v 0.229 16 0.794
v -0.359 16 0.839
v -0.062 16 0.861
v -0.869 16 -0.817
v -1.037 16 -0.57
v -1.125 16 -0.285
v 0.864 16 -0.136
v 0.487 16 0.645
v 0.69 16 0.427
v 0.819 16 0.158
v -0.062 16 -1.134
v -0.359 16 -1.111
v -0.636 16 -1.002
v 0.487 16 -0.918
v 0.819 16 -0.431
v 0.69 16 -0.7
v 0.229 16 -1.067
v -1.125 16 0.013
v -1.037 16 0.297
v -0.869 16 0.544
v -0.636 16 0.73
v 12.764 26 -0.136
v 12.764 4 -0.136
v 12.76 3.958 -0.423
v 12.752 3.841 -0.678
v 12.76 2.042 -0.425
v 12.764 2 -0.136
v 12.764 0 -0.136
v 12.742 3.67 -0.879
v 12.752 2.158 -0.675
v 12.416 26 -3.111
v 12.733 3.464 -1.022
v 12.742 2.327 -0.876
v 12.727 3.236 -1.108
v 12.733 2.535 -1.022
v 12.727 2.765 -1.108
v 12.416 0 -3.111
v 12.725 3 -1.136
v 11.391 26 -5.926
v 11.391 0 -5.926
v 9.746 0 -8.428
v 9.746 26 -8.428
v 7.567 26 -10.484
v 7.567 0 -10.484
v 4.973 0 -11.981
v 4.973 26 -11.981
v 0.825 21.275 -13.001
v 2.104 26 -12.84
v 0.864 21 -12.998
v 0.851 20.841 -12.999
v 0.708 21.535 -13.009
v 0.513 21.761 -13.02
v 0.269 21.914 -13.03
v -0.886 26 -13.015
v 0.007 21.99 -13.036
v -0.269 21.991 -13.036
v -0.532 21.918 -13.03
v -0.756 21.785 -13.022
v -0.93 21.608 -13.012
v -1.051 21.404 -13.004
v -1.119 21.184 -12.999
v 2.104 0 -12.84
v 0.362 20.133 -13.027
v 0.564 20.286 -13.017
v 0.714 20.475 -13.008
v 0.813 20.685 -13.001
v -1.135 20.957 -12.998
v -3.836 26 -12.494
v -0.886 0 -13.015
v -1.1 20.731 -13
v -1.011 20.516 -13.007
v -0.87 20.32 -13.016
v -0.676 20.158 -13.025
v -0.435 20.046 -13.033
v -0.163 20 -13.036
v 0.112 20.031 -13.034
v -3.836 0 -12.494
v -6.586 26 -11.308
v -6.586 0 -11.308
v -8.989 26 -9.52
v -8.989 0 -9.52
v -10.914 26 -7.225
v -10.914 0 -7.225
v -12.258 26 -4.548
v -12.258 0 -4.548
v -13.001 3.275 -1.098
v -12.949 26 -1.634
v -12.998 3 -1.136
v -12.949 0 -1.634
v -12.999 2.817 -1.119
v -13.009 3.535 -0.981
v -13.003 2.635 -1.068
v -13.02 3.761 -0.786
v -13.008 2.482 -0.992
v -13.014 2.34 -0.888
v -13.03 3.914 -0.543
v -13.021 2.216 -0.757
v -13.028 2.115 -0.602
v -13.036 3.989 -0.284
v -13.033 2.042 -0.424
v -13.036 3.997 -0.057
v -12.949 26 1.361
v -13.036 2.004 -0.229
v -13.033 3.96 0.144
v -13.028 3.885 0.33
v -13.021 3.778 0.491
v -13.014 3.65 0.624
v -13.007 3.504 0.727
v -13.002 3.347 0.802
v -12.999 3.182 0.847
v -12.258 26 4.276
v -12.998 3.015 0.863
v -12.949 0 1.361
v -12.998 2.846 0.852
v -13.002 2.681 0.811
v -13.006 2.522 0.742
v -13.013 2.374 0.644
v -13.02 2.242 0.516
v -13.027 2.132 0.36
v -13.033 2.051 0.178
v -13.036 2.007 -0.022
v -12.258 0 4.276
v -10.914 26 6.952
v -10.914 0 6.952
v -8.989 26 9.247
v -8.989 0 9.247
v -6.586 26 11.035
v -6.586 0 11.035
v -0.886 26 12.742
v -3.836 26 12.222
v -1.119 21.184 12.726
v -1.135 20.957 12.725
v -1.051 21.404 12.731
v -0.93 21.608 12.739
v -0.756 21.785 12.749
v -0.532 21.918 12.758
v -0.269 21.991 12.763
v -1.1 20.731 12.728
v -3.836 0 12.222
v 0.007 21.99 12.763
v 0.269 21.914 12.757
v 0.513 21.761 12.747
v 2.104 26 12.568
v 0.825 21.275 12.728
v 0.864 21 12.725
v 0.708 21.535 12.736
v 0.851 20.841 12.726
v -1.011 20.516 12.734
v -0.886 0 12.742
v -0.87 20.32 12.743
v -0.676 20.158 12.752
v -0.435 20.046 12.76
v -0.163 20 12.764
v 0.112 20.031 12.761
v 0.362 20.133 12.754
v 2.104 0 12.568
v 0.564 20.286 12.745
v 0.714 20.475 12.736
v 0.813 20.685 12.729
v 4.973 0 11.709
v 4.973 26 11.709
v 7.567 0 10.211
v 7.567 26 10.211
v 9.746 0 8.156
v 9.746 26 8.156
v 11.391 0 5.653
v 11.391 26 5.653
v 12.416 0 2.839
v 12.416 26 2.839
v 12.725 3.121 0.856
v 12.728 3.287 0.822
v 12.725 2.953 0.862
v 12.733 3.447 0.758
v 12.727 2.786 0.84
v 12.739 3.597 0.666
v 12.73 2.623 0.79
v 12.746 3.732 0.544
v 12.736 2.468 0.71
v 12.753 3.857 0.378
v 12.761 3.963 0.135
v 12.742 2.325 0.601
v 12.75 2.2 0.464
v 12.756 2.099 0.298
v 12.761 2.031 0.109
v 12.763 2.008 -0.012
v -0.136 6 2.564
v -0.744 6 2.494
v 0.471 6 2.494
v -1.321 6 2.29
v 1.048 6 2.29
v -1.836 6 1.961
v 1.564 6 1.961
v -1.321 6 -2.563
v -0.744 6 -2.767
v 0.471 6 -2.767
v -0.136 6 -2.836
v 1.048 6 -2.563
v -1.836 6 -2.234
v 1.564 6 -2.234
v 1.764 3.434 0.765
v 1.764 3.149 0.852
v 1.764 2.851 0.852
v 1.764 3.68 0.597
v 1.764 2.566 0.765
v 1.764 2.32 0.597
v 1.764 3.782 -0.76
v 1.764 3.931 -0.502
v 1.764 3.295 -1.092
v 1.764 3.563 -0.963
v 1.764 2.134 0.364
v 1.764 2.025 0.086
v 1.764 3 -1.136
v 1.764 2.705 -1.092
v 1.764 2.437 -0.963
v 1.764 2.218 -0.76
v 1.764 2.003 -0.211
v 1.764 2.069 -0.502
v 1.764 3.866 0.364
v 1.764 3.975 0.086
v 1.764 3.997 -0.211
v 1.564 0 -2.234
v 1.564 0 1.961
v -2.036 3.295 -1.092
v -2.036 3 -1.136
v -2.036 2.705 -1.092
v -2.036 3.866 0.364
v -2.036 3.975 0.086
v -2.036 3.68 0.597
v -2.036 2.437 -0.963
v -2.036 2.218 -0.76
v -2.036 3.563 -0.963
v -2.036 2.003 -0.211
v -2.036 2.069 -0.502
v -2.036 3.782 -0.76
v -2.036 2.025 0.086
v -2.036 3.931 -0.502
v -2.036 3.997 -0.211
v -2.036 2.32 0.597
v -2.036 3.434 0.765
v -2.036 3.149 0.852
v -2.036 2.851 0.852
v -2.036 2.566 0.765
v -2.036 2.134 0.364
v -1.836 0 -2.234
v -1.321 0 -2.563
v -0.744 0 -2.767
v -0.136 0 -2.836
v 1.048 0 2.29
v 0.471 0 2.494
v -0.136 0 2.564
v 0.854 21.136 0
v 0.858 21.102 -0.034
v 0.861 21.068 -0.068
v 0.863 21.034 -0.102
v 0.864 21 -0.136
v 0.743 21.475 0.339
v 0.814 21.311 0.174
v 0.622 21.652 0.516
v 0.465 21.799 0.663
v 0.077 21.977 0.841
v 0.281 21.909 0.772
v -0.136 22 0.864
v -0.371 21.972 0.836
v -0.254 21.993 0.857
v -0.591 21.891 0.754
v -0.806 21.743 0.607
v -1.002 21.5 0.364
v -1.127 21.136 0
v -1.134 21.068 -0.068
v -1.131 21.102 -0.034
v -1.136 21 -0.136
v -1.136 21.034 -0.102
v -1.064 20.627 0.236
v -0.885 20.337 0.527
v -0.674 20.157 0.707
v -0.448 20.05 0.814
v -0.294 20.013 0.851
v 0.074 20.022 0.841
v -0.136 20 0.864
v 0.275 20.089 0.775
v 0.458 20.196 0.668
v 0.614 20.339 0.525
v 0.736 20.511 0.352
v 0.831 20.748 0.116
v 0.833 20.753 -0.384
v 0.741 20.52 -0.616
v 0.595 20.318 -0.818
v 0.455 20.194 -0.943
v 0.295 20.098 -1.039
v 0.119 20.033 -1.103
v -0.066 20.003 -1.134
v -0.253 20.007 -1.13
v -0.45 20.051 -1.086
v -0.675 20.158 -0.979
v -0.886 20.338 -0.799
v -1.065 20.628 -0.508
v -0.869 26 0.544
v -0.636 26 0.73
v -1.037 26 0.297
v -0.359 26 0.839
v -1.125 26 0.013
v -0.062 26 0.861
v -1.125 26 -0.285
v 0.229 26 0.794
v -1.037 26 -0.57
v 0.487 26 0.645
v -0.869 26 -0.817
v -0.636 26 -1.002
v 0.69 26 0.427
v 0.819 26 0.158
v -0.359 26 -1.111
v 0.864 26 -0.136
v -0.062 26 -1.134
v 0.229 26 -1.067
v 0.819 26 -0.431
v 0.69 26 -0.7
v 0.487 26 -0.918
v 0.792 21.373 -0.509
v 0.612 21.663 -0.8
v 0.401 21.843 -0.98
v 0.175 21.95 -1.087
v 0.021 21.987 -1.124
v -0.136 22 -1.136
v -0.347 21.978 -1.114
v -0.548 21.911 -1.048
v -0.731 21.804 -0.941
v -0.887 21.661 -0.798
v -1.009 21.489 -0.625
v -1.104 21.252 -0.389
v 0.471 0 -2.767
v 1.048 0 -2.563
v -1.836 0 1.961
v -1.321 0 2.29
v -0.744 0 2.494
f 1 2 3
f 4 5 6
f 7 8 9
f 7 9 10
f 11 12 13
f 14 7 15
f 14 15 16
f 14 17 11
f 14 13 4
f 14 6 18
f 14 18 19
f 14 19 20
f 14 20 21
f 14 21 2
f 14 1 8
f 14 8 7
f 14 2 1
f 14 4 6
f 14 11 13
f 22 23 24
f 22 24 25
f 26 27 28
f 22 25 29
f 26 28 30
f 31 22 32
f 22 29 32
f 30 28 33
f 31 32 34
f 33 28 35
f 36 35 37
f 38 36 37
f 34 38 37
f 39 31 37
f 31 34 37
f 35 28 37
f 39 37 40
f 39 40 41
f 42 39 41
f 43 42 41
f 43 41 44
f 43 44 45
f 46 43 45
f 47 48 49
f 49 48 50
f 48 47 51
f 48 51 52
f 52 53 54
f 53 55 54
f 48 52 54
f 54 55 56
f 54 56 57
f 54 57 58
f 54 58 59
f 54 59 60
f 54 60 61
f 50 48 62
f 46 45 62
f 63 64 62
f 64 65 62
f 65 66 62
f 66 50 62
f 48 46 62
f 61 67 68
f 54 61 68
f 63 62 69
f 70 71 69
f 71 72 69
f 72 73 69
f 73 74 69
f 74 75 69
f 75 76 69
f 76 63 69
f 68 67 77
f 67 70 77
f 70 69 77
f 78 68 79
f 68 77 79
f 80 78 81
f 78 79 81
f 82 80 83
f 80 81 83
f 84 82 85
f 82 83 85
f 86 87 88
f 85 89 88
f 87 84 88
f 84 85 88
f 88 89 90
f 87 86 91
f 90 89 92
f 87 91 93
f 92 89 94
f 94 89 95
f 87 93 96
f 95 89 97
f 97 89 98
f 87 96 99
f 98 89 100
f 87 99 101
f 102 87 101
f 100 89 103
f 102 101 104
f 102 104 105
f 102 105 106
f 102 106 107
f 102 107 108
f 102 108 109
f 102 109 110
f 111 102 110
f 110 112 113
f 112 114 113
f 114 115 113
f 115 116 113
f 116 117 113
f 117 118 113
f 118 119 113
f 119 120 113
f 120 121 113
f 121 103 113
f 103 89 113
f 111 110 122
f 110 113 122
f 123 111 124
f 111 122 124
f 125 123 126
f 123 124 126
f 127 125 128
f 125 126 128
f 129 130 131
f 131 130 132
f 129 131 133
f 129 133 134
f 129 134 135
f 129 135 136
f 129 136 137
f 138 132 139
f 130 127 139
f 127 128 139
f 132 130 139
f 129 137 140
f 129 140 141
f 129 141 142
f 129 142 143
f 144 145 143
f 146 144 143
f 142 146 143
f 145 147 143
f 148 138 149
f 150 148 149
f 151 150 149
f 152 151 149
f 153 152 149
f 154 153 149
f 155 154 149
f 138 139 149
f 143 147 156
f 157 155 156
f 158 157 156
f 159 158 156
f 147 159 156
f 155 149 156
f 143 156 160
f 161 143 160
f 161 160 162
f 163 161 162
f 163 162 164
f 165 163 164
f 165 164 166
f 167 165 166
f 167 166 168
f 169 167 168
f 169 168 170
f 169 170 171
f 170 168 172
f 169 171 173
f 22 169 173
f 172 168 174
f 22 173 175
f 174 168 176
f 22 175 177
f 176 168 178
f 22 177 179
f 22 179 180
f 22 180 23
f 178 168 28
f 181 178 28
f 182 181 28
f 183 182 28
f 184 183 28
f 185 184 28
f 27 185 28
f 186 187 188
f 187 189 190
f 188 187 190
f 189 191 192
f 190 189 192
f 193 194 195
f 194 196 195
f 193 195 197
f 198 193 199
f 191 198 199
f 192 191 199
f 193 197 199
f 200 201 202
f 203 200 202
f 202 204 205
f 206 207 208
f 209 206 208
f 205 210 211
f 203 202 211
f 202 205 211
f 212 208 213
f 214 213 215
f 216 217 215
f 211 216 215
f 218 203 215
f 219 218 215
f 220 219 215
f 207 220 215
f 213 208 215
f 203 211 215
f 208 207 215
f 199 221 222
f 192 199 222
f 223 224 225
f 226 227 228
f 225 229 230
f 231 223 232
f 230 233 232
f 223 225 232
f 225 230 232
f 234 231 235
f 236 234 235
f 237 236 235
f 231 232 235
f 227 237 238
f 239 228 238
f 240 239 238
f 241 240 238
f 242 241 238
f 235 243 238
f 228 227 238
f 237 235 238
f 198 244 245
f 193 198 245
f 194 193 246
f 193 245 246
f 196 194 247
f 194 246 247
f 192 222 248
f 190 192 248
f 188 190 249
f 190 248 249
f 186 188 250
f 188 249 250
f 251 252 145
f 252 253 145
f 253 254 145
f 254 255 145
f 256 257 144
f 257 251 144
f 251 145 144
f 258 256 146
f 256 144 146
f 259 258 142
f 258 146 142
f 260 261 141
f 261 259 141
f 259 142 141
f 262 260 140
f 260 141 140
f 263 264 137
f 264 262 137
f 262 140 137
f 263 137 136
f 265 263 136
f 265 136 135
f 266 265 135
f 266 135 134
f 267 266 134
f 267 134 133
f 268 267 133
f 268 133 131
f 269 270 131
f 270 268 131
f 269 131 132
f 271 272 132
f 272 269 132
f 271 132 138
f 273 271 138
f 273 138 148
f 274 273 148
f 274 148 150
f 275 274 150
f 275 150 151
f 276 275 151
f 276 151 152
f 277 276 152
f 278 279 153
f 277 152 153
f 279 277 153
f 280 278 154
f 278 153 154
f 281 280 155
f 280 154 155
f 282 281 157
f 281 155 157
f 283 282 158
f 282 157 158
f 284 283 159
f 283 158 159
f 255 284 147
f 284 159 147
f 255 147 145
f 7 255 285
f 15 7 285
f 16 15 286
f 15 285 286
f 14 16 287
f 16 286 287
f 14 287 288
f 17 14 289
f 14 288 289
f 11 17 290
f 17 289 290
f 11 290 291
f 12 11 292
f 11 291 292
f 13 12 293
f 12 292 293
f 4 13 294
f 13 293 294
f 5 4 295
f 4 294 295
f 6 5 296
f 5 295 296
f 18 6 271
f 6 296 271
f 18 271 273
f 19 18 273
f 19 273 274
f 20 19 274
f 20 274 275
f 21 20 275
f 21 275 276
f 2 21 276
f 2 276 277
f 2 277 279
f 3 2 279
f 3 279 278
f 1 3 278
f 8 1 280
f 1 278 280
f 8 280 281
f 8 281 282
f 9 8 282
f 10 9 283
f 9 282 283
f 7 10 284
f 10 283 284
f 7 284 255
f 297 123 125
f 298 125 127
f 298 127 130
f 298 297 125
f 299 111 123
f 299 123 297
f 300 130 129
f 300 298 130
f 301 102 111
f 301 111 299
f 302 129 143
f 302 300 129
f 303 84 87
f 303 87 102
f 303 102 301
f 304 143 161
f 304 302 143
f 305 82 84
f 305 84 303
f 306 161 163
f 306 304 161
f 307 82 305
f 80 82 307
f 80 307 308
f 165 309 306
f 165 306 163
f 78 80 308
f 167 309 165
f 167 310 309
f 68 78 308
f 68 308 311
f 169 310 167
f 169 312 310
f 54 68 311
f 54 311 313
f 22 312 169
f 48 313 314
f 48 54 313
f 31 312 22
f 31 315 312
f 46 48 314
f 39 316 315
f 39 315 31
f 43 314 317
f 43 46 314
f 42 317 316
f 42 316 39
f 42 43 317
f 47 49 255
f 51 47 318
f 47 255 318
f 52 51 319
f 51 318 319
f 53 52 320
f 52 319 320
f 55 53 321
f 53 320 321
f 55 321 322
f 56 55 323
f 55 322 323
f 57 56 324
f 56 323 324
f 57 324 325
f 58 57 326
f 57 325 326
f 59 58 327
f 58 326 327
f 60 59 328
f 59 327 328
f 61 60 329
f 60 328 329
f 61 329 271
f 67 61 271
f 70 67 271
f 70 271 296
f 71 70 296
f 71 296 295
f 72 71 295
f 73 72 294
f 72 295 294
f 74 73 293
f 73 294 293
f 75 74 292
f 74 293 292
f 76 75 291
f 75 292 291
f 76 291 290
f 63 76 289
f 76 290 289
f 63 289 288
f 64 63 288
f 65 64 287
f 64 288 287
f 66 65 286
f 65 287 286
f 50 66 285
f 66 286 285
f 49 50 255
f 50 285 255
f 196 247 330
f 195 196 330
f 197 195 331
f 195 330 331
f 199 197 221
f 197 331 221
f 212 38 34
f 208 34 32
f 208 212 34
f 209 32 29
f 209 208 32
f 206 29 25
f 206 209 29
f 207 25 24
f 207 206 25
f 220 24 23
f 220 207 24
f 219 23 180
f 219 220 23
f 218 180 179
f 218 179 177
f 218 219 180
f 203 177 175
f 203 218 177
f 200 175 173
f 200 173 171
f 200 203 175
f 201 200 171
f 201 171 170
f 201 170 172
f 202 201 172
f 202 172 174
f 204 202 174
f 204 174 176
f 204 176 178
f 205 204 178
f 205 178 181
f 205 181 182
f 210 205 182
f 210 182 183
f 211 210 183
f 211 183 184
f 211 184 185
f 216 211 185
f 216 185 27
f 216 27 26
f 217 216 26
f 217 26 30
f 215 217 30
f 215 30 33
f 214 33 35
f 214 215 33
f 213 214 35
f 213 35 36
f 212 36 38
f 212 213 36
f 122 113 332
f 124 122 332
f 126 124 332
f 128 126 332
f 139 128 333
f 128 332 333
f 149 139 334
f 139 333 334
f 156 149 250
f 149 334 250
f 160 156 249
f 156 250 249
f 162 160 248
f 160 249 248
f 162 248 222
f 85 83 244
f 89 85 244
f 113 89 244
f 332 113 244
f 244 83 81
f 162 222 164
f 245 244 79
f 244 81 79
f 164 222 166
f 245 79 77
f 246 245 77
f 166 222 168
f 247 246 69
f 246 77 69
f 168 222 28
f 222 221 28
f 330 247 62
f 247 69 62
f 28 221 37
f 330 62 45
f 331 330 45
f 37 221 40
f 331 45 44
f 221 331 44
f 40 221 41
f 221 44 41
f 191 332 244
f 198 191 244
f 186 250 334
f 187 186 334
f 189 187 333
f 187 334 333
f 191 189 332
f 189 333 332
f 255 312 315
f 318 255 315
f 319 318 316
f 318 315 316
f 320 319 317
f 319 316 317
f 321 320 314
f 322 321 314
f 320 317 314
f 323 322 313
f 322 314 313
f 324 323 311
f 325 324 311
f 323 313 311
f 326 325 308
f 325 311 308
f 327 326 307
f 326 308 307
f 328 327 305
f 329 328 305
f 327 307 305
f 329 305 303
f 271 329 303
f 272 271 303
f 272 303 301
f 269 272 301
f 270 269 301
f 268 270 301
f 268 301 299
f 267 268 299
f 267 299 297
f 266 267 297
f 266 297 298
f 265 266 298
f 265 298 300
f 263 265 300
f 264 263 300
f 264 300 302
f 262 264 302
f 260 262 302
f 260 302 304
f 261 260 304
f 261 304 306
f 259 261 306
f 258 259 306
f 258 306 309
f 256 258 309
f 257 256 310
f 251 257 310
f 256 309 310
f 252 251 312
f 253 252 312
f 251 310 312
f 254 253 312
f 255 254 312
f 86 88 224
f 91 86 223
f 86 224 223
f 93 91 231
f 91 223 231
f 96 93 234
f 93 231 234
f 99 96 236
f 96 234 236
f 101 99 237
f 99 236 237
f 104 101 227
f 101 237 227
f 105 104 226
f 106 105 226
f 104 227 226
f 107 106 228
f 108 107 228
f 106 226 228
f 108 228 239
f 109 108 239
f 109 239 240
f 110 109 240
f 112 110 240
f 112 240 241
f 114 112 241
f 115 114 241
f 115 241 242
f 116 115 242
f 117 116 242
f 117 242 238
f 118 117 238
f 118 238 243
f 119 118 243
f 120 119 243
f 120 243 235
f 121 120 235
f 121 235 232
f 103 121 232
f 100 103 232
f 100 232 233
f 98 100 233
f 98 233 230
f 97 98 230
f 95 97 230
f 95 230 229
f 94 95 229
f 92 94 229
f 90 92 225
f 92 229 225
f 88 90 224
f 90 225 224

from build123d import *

# Parameters (mm, degrees)
SKETCH1_R               = 12.9
BOSS_EXTRUDE1_DEPTH     = 6
SKETCH2_R               = 12.9
BOSS_EXTRUDE2_DEPTH     = 20
SKETCH3_R               = 1
CUT_EXTRUDE2_DEPTH      = 5
SKETCH4_R               = 1
CUT_EXTRUDE3_DEPTH      = 18
CUT_EXTRUDE3_DEPTH_BACK = 19
CUT_EXTRUDE4_DEPTH      = 19
CUT_EXTRUDE4_DEPTH_BACK = 19
BOSS_EXTRUDE3_DEPTH     = 6
SKETCH7_R               = 1
CUT_EXTRUDE5_DEPTH      = 10


with BuildPart() as part:
    # Sketch1 → Boss-Extrude1 (new body)
    with BuildSketch(Plane(origin=(0, 0, 0), x_dir=(1, 0, 0), z_dir=(0, 1, 0))):
        with Locations((-0.136395343, 0.136395343)):
            Circle(SKETCH1_R)
        with BuildLine():
            Line((-2.036395343, -1.607164235), (-2.036395343, -2.054494887))
            ThreePointArc((-2.036395343, -2.054494887), (-1.150401835, -2.580549786), (-0.136395343, -2.763604657))
            ThreePointArc((-0.136395343, -2.763604657), (0.877611149, -2.580549786), (1.763604657, -2.054494887))
            Line((1.763604657, -2.054494887), (1.763604657, -1.607164235))
            Line((1.763604657, -1.607164235), (1.763604657, 1.87995492))
            Line((1.763604657, 1.87995492), (1.763604657, 2.327285573))
            ThreePointArc((1.763604657, 2.327285573), (0.877611149, 2.853340472), (-0.136395343, 3.036395343))
            ThreePointArc((-0.136395343, 3.036395343), (-1.150401835, 2.853340472), (-2.036395343, 2.327285573))
            Line((-2.036395343, 2.327285573), (-2.036395343, 1.87995492))
            Line((-2.036395343, 1.87995492), (-2.036395343, -1.607164235))
        make_face(mode=Mode.SUBTRACT)
    extrude(amount=BOSS_EXTRUDE1_DEPTH)

    # Sketch2 → Boss-Extrude2 (add)
    with BuildSketch(Plane(origin=(0, 6, 0), x_dir=(1, 0, 0), z_dir=(0, 1, 0))):
        with Locations((-0.136395343, 0.136395343)):
            Circle(SKETCH2_R)
    extrude(amount=BOSS_EXTRUDE2_DEPTH)

    # Sketch3 → Cut-Extrude2 (cut)
    with BuildSketch(Plane(origin=(0, 26, 0), x_dir=(1, 0, 0), z_dir=(0, 1, 0))):
        with Locations((-0.136395343, 0.136395343)):
            Circle(SKETCH3_R)
    extrude(amount=-CUT_EXTRUDE2_DEPTH, mode=Mode.SUBTRACT)

    # Sketch4 → Cut-Extrude3 (cut, two sides)
    with BuildSketch(Plane(origin=(0, 0, 0), x_dir=(0, 0, -1), z_dir=(1, 0, 0))) as cut_extrude3_sk:
        with Locations((0.136395343, 3)):
            Circle(SKETCH4_R)
    extrude(amount=CUT_EXTRUDE3_DEPTH, mode=Mode.SUBTRACT)
    extrude(cut_extrude3_sk.sketch, amount=-CUT_EXTRUDE3_DEPTH_BACK, mode=Mode.SUBTRACT)

    # Sketch5 → Cut-Extrude4 (cut, two sides)
    with BuildSketch(Plane.XY) as cut_extrude4_sk:
        with BuildLine():
            ThreePointArc((-1.136395343, 21), (-0.136395343, 20), (0.863604657, 21))
            Line((0.863604657, 21), (-1.136395343, 21))
        make_face()
        with BuildLine():
            Line((-1.136395343, 21), (0.863604657, 21))
            ThreePointArc((0.863604657, 21), (-0.136395343, 22), (-1.136395343, 21))
        make_face()
        with BuildLine():
            ThreePointArc((-1.136395343, 21), (-0.136395343, 20), (0.863604657, 21))
            Line((0.863604657, 21), (-1.136395343, 21))
        make_face()
        with BuildLine():
            Line((-1.136395343, 21), (0.863604657, 21))
            ThreePointArc((0.863604657, 21), (-0.136395343, 22), (-1.136395343, 21))
        make_face()
    extrude(amount=CUT_EXTRUDE4_DEPTH, mode=Mode.SUBTRACT)
    extrude(cut_extrude4_sk.sketch, amount=-CUT_EXTRUDE4_DEPTH_BACK, mode=Mode.SUBTRACT)

    # Sketch6 → Boss-Extrude3 (add)
    with BuildSketch(Plane.XZ):
        with BuildLine():
            ThreePointArc((-2.036395343, 2.054494887), (-0.136395343, 2.763604657), (1.763604657, 2.054494887))
            Line((1.763604657, 2.054494887), (1.763604657, -2.327285573))
            ThreePointArc((1.763604657, -2.327285573), (-0.136395343, -3.036395343), (-2.036395343, -2.327285573))
            Line((-2.036395343, -2.327285573), (-2.036395343, 2.054494887))
        make_face()
        with BuildLine():
            ThreePointArc((-0.136395343, 2.563604657), (-1.038180301, 2.408557287), (-1.836395343, 1.961222353))
            Line((-1.836395343, 1.961222353), (-1.836395343, 1.607164235))
            Line((-1.836395343, 1.607164235), (-1.836395343, -1.87995492))
            Line((-1.836395343, -1.87995492), (-1.836395343, -2.234013039))
            ThreePointArc((-1.836395343, -2.234013039), (-1.038180301, -2.681347973), (-0.136395343, -2.836395343))
            ThreePointArc((-0.136395343, -2.836395343), (0.765389615, -2.681347973), (1.563604657, -2.234013039))
            Line((1.563604657, -2.234013039), (1.563604657, -1.87995492))
            Line((1.563604657, -1.87995492), (1.563604657, 1.607164235))
            Line((1.563604657, 1.607164235), (1.563604657, 1.961222353))
            ThreePointArc((1.563604657, 1.961222353), (0.765389615, 2.408557287), (-0.136395343, 2.563604657))
        make_face(mode=Mode.SUBTRACT)
    extrude(amount=-BOSS_EXTRUDE3_DEPTH)

    # Sketch7 → Cut-Extrude5 (cut)
    with BuildSketch(Plane(origin=(0, 26, 0), x_dir=(1, 0, 0), z_dir=(0, 1, 0))):
        with Locations((-0.136395343, 0.136395343)):
            Circle(SKETCH7_R)
        with Locations((-0.136395343, 0.136395343)):
            Circle(SKETCH7_R)
    extrude(amount=-CUT_EXTRUDE5_DEPTH, mode=Mode.SUBTRACT)


solid = part.part
